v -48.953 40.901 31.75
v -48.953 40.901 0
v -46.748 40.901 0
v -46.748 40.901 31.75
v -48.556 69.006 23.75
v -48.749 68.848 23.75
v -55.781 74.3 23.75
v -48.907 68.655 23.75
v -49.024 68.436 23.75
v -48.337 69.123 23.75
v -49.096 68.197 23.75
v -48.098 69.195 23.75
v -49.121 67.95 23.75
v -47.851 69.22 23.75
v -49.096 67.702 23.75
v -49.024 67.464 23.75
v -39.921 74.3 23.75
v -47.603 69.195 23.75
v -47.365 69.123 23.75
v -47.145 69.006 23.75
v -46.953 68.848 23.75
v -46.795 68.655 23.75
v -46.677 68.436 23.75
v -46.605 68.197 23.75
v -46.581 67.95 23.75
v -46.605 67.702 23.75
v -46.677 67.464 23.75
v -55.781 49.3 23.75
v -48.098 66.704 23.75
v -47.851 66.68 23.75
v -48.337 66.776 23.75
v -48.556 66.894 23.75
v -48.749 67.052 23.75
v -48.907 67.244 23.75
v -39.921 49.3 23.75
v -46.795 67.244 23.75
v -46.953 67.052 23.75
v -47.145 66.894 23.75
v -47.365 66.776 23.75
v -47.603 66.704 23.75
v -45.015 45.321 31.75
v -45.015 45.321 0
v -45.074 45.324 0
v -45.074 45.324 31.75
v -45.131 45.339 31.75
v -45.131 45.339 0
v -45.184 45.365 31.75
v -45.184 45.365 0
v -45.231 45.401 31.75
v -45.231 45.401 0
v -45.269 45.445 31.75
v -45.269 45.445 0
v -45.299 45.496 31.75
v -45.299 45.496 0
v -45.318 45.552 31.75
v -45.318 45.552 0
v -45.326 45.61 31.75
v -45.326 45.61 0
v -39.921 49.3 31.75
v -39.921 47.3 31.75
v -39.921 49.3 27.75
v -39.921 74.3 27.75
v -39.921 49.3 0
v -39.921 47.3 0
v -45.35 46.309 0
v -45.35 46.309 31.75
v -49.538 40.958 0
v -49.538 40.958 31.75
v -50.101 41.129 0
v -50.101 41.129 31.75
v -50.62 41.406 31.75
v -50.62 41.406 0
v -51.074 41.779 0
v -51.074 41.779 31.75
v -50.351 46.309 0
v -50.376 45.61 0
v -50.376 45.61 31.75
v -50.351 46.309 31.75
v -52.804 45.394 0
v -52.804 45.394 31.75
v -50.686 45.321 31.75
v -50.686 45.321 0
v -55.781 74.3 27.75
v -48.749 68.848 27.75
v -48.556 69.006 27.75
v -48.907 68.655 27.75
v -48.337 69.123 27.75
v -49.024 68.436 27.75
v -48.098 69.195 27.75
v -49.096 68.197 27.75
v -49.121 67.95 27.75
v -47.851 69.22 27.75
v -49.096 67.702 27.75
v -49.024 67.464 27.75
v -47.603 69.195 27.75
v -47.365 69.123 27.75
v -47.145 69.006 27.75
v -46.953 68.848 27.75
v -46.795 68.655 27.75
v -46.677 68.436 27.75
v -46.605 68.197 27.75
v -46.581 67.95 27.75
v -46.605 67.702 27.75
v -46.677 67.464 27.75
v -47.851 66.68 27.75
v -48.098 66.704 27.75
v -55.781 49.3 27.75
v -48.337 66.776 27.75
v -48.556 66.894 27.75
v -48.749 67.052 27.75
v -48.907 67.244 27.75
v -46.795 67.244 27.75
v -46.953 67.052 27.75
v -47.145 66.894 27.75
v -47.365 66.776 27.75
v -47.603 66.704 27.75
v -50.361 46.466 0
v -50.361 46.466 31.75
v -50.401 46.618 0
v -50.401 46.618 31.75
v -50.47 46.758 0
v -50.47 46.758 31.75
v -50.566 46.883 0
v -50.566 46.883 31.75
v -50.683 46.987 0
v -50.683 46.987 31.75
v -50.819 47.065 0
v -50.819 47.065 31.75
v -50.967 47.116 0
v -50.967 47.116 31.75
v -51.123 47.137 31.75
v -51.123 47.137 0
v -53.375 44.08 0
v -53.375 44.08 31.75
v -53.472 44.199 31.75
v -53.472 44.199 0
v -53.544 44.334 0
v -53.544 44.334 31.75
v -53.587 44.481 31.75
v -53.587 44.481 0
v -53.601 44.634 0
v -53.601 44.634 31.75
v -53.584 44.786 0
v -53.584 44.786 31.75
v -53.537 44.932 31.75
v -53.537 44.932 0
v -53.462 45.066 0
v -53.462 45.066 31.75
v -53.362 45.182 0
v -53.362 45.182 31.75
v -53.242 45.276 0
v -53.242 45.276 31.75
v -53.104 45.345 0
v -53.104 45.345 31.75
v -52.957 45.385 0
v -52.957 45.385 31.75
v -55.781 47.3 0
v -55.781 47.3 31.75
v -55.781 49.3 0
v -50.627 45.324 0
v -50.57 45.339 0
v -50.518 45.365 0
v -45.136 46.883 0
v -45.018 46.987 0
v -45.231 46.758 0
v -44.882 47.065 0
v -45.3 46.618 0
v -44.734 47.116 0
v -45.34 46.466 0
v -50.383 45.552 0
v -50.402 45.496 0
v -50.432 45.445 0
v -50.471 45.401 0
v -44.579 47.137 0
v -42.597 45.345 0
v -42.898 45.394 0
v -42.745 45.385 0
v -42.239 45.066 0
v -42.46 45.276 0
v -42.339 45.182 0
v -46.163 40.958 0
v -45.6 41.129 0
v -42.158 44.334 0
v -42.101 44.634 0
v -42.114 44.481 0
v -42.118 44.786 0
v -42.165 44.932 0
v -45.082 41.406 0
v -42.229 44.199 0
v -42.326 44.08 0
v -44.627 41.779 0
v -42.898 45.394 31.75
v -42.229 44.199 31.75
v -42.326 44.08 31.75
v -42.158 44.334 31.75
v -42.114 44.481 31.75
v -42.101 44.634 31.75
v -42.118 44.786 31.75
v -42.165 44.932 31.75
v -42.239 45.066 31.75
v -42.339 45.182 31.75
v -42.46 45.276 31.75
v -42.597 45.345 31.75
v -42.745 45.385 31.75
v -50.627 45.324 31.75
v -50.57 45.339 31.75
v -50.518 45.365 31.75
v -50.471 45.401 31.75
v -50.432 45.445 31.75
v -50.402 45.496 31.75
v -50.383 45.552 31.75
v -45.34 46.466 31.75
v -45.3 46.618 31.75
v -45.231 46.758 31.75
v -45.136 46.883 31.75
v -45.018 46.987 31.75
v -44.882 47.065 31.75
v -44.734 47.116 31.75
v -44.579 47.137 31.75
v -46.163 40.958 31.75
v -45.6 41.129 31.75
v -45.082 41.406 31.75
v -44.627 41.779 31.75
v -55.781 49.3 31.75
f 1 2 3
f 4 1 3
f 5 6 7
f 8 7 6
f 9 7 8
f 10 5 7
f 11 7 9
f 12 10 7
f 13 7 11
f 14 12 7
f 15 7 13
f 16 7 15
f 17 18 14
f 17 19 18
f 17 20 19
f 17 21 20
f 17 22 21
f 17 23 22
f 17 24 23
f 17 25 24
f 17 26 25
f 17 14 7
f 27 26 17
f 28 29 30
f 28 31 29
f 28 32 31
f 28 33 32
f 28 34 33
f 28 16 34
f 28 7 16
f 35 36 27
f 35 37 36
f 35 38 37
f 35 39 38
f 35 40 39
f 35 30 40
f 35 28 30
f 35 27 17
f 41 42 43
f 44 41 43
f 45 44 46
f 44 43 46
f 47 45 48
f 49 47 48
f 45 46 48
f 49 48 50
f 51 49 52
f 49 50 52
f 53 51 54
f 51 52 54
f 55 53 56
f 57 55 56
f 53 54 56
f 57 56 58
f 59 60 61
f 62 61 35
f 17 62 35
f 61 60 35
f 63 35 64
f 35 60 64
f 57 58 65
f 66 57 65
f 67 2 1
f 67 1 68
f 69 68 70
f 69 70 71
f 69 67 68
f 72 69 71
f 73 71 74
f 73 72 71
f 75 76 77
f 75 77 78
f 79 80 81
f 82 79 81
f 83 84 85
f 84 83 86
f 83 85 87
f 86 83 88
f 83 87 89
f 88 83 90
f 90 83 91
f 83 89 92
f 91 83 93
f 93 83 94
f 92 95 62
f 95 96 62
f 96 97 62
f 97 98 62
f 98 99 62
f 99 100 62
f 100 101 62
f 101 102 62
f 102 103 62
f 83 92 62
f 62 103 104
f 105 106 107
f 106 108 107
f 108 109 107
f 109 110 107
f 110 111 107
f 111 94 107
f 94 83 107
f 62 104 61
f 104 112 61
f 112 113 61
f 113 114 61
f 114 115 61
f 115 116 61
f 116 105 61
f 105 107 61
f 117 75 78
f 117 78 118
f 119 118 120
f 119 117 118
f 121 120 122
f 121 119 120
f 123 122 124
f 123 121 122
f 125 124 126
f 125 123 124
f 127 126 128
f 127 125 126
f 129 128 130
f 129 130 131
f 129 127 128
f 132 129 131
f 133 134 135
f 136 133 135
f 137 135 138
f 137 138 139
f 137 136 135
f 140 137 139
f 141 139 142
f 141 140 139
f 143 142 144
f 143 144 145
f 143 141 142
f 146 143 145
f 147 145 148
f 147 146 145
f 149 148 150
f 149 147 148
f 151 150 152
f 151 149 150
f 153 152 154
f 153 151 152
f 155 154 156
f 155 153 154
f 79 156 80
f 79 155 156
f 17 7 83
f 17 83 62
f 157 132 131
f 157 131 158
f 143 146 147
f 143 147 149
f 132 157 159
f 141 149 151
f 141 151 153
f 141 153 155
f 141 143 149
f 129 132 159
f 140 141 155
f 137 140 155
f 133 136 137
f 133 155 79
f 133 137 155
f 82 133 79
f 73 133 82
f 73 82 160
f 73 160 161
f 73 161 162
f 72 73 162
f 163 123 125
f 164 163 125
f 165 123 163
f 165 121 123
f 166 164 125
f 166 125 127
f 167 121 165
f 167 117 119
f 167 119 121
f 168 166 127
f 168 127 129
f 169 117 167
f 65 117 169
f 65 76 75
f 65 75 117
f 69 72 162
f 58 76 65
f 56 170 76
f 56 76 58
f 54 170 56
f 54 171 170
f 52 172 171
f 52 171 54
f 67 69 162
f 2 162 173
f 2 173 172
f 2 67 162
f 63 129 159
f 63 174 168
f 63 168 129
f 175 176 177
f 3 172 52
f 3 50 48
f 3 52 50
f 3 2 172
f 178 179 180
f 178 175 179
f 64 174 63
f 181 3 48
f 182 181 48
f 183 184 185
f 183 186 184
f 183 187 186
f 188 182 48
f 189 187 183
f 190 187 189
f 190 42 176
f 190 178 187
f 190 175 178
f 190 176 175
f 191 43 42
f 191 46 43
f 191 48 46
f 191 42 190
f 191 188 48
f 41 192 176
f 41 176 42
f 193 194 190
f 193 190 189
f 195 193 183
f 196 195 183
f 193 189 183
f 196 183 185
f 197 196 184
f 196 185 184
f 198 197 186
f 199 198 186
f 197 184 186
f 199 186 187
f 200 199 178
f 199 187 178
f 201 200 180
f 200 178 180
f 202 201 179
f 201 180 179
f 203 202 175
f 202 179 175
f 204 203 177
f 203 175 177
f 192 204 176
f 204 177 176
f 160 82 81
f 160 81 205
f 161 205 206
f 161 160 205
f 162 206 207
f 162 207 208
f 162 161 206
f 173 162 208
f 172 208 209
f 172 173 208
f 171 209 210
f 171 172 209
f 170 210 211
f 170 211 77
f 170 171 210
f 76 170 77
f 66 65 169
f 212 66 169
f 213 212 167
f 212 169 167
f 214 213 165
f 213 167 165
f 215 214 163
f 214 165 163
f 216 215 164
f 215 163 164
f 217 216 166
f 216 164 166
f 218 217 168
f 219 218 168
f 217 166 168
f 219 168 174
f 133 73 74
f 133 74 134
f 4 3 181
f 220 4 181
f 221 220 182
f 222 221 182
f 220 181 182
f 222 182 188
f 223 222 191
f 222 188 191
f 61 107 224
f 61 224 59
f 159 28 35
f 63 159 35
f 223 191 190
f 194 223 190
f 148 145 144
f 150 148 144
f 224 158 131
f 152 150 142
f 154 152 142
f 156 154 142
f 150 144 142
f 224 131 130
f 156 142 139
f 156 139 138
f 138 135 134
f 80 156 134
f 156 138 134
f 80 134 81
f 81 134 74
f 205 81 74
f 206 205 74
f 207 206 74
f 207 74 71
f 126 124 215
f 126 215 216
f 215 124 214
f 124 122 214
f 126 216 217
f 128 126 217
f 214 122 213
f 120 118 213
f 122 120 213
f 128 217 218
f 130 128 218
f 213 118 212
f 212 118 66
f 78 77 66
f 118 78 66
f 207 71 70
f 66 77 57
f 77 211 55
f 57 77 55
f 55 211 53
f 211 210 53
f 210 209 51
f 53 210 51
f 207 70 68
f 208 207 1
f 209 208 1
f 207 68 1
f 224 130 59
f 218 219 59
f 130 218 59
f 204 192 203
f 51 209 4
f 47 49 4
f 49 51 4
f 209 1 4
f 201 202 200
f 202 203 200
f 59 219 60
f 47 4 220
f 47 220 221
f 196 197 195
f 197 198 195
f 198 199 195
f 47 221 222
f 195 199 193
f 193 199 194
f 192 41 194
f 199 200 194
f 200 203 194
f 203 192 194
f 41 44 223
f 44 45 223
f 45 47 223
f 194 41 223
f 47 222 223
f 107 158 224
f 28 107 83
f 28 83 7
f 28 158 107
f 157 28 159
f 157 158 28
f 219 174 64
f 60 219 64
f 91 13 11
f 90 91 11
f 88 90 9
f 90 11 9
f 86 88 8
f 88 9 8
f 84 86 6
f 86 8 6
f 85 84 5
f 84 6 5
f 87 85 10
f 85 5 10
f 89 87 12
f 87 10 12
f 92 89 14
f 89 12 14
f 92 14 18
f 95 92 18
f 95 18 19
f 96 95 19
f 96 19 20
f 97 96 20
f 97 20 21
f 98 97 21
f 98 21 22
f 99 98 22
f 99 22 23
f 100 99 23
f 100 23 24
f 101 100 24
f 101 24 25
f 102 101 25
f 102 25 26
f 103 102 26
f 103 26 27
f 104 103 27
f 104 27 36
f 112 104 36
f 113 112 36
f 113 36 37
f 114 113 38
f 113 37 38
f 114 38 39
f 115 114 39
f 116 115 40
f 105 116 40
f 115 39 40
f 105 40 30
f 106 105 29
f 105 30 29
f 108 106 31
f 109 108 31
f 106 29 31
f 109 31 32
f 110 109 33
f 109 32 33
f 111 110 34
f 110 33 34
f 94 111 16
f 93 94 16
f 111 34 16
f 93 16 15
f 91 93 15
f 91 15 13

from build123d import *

# Parameters (mm, degrees)
BOSS_EXTRUDE1_DEPTH = 31.75
SKETCH19_W          = 15.860402013
SKETCH19_H          = 31.75
BOSS_EXTRUDE7_DEPTH = 2
SKETCH23_W          = 15.860402013
SKETCH23_H          = 4
BOSS_EXTRUDE8_DEPTH = 25
SKETCH24_R          = 1.27
CUT_EXTRUDE1_DEPTH  = 9


with BuildPart() as part:
    # Sketch2 → Boss-Extrude1 (new body)
    with BuildSketch(Plane.XY):
        with BuildLine():
            Line((-50.375618534, 45.609862895), (-50.351188886, 46.309436474))
            ThreePointArc((-50.351188886, 46.309436474), (-50.565618587, 46.88295476), (-51.12278195, 47.136868733))
            Line((-51.12278195, 47.136868733), (-55.780902554, 47.299533889))
            Line((-55.780902554, 47.299533889), (-47.850701548, 47.299533889))
            Line((-47.850701548, 47.299533889), (-47.850701548, 40.900752235))
            Line((-47.850701548, 40.900752235), (-48.952946324, 40.900752235))
            ThreePointArc((-48.952946324, 40.900752235), (-50.100996621, 41.129113637), (-51.074266668, 41.779431891))
            Line((-51.074266668, 41.779431891), (-53.375146928, 44.080312152))
            ThreePointArc((-53.375146928, 44.080312152), (-53.536830204, 44.931922499), (-52.803734096, 45.394471696))
            Line((-52.803734096, 45.394471696), (-50.685905631, 45.320515496))
            ThreePointArc((-50.685905631, 45.320515496), (-50.470836274, 45.400926634), (-50.375618534, 45.609862895))
        make_face()
    boss_extrude1 = extrude(amount=BOSS_EXTRUDE1_DEPTH)

    # Mirror2: Boss-Extrude1 across plane
    add(boss_extrude1.mirror(Plane(origin=(-47.850701548, 40.900752235, 31.75), x_dir=(0, 0, 1), z_dir=(-1, 0, 0))))

    # Sketch19 → Boss-Extrude7 (add)
    with BuildSketch(Plane(origin=(0, 47.299533889, 0), x_dir=(1, 0, 0), z_dir=(0, 1, 0))):
        with Locations((-47.850701548, -15.875)):
            Rectangle(SKETCH19_W, SKETCH19_H)
    extrude(amount=BOSS_EXTRUDE7_DEPTH)

    # Sketch23 → Boss-Extrude8 (add)
    with BuildSketch(Plane(origin=(0, 49.299533889, 0), x_dir=(1, 0, 0), z_dir=(0, 1, 0))):
        with Locations((-47.850701548, -25.75)):
            Rectangle(SKETCH23_W, SKETCH23_H)
    extrude(amount=BOSS_EXTRUDE8_DEPTH)

    # Sketch24 → Cut-Extrude1 (cut, through all)
    with BuildSketch(Plane(origin=(0, 0, 23.75), x_dir=(-1, 0, 0), z_dir=(0, 0, -1))):
        with Locations((47.850701548, 67.949533889)):
            Circle(SKETCH24_R)
    extrude(amount=-CUT_EXTRUDE1_DEPTH, mode=Mode.SUBTRACT)


solid = part.part
